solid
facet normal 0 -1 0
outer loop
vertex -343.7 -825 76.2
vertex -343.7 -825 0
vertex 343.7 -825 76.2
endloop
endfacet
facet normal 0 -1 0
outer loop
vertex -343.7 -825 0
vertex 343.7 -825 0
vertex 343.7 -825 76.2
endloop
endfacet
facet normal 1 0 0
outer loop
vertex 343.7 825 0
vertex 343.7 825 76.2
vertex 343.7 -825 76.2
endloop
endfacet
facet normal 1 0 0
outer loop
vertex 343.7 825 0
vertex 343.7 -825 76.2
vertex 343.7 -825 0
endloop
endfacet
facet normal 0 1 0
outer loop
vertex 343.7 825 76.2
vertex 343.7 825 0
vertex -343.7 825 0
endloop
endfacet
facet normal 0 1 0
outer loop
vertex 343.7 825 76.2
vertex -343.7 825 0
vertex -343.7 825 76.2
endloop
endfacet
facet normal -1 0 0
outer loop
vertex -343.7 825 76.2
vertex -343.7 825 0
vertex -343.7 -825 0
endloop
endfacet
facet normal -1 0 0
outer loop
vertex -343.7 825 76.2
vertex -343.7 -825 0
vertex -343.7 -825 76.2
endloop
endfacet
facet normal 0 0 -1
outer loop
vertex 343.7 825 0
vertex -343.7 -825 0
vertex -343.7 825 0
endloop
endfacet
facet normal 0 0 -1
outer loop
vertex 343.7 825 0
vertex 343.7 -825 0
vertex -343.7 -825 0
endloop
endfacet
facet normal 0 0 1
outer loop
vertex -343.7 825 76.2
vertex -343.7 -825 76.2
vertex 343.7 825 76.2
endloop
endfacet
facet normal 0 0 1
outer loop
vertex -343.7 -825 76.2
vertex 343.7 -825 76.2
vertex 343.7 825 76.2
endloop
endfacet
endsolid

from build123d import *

# Parameters (mm, degrees)
SKETCH1_W           = 535.000000102
SKETCH1_H           = 1650
BOSS_EXTRUDE1_DEPTH = 76.2
SKETCH2_W           = 76.2
SKETCH2_H           = 1650
BOSS_EXTRUDE2_DEPTH = 76.2
SKETCH3_W           = 76.2
SKETCH3_H           = 1650
BOSS_EXTRUDE3_DEPTH = 76.2


with BuildPart() as part:
    # Sketch1 → Boss-Extrude1 (new body)
    with BuildSketch(Plane.XY):
        Rectangle(SKETCH1_W, SKETCH1_H)
    extrude(amount=BOSS_EXTRUDE1_DEPTH)

    # Sketch2 → Boss-Extrude2 (add)
    with BuildSketch(Plane(origin=(267.500000051, 0, 0), x_dir=(0, 0, -1), z_dir=(1, 0, 0))):
        with Locations((-38.1, 0)):
            Rectangle(SKETCH2_W, SKETCH2_H)
    extrude(amount=BOSS_EXTRUDE2_DEPTH)

    # Sketch3 → Boss-Extrude3 (add)
    with BuildSketch(Plane.ZY.offset(267.500000051)):
        with Locations((38.1, 0)):
            Rectangle(SKETCH3_W, SKETCH3_H)
    extrude(amount=BOSS_EXTRUDE3_DEPTH)


solid = part.part
